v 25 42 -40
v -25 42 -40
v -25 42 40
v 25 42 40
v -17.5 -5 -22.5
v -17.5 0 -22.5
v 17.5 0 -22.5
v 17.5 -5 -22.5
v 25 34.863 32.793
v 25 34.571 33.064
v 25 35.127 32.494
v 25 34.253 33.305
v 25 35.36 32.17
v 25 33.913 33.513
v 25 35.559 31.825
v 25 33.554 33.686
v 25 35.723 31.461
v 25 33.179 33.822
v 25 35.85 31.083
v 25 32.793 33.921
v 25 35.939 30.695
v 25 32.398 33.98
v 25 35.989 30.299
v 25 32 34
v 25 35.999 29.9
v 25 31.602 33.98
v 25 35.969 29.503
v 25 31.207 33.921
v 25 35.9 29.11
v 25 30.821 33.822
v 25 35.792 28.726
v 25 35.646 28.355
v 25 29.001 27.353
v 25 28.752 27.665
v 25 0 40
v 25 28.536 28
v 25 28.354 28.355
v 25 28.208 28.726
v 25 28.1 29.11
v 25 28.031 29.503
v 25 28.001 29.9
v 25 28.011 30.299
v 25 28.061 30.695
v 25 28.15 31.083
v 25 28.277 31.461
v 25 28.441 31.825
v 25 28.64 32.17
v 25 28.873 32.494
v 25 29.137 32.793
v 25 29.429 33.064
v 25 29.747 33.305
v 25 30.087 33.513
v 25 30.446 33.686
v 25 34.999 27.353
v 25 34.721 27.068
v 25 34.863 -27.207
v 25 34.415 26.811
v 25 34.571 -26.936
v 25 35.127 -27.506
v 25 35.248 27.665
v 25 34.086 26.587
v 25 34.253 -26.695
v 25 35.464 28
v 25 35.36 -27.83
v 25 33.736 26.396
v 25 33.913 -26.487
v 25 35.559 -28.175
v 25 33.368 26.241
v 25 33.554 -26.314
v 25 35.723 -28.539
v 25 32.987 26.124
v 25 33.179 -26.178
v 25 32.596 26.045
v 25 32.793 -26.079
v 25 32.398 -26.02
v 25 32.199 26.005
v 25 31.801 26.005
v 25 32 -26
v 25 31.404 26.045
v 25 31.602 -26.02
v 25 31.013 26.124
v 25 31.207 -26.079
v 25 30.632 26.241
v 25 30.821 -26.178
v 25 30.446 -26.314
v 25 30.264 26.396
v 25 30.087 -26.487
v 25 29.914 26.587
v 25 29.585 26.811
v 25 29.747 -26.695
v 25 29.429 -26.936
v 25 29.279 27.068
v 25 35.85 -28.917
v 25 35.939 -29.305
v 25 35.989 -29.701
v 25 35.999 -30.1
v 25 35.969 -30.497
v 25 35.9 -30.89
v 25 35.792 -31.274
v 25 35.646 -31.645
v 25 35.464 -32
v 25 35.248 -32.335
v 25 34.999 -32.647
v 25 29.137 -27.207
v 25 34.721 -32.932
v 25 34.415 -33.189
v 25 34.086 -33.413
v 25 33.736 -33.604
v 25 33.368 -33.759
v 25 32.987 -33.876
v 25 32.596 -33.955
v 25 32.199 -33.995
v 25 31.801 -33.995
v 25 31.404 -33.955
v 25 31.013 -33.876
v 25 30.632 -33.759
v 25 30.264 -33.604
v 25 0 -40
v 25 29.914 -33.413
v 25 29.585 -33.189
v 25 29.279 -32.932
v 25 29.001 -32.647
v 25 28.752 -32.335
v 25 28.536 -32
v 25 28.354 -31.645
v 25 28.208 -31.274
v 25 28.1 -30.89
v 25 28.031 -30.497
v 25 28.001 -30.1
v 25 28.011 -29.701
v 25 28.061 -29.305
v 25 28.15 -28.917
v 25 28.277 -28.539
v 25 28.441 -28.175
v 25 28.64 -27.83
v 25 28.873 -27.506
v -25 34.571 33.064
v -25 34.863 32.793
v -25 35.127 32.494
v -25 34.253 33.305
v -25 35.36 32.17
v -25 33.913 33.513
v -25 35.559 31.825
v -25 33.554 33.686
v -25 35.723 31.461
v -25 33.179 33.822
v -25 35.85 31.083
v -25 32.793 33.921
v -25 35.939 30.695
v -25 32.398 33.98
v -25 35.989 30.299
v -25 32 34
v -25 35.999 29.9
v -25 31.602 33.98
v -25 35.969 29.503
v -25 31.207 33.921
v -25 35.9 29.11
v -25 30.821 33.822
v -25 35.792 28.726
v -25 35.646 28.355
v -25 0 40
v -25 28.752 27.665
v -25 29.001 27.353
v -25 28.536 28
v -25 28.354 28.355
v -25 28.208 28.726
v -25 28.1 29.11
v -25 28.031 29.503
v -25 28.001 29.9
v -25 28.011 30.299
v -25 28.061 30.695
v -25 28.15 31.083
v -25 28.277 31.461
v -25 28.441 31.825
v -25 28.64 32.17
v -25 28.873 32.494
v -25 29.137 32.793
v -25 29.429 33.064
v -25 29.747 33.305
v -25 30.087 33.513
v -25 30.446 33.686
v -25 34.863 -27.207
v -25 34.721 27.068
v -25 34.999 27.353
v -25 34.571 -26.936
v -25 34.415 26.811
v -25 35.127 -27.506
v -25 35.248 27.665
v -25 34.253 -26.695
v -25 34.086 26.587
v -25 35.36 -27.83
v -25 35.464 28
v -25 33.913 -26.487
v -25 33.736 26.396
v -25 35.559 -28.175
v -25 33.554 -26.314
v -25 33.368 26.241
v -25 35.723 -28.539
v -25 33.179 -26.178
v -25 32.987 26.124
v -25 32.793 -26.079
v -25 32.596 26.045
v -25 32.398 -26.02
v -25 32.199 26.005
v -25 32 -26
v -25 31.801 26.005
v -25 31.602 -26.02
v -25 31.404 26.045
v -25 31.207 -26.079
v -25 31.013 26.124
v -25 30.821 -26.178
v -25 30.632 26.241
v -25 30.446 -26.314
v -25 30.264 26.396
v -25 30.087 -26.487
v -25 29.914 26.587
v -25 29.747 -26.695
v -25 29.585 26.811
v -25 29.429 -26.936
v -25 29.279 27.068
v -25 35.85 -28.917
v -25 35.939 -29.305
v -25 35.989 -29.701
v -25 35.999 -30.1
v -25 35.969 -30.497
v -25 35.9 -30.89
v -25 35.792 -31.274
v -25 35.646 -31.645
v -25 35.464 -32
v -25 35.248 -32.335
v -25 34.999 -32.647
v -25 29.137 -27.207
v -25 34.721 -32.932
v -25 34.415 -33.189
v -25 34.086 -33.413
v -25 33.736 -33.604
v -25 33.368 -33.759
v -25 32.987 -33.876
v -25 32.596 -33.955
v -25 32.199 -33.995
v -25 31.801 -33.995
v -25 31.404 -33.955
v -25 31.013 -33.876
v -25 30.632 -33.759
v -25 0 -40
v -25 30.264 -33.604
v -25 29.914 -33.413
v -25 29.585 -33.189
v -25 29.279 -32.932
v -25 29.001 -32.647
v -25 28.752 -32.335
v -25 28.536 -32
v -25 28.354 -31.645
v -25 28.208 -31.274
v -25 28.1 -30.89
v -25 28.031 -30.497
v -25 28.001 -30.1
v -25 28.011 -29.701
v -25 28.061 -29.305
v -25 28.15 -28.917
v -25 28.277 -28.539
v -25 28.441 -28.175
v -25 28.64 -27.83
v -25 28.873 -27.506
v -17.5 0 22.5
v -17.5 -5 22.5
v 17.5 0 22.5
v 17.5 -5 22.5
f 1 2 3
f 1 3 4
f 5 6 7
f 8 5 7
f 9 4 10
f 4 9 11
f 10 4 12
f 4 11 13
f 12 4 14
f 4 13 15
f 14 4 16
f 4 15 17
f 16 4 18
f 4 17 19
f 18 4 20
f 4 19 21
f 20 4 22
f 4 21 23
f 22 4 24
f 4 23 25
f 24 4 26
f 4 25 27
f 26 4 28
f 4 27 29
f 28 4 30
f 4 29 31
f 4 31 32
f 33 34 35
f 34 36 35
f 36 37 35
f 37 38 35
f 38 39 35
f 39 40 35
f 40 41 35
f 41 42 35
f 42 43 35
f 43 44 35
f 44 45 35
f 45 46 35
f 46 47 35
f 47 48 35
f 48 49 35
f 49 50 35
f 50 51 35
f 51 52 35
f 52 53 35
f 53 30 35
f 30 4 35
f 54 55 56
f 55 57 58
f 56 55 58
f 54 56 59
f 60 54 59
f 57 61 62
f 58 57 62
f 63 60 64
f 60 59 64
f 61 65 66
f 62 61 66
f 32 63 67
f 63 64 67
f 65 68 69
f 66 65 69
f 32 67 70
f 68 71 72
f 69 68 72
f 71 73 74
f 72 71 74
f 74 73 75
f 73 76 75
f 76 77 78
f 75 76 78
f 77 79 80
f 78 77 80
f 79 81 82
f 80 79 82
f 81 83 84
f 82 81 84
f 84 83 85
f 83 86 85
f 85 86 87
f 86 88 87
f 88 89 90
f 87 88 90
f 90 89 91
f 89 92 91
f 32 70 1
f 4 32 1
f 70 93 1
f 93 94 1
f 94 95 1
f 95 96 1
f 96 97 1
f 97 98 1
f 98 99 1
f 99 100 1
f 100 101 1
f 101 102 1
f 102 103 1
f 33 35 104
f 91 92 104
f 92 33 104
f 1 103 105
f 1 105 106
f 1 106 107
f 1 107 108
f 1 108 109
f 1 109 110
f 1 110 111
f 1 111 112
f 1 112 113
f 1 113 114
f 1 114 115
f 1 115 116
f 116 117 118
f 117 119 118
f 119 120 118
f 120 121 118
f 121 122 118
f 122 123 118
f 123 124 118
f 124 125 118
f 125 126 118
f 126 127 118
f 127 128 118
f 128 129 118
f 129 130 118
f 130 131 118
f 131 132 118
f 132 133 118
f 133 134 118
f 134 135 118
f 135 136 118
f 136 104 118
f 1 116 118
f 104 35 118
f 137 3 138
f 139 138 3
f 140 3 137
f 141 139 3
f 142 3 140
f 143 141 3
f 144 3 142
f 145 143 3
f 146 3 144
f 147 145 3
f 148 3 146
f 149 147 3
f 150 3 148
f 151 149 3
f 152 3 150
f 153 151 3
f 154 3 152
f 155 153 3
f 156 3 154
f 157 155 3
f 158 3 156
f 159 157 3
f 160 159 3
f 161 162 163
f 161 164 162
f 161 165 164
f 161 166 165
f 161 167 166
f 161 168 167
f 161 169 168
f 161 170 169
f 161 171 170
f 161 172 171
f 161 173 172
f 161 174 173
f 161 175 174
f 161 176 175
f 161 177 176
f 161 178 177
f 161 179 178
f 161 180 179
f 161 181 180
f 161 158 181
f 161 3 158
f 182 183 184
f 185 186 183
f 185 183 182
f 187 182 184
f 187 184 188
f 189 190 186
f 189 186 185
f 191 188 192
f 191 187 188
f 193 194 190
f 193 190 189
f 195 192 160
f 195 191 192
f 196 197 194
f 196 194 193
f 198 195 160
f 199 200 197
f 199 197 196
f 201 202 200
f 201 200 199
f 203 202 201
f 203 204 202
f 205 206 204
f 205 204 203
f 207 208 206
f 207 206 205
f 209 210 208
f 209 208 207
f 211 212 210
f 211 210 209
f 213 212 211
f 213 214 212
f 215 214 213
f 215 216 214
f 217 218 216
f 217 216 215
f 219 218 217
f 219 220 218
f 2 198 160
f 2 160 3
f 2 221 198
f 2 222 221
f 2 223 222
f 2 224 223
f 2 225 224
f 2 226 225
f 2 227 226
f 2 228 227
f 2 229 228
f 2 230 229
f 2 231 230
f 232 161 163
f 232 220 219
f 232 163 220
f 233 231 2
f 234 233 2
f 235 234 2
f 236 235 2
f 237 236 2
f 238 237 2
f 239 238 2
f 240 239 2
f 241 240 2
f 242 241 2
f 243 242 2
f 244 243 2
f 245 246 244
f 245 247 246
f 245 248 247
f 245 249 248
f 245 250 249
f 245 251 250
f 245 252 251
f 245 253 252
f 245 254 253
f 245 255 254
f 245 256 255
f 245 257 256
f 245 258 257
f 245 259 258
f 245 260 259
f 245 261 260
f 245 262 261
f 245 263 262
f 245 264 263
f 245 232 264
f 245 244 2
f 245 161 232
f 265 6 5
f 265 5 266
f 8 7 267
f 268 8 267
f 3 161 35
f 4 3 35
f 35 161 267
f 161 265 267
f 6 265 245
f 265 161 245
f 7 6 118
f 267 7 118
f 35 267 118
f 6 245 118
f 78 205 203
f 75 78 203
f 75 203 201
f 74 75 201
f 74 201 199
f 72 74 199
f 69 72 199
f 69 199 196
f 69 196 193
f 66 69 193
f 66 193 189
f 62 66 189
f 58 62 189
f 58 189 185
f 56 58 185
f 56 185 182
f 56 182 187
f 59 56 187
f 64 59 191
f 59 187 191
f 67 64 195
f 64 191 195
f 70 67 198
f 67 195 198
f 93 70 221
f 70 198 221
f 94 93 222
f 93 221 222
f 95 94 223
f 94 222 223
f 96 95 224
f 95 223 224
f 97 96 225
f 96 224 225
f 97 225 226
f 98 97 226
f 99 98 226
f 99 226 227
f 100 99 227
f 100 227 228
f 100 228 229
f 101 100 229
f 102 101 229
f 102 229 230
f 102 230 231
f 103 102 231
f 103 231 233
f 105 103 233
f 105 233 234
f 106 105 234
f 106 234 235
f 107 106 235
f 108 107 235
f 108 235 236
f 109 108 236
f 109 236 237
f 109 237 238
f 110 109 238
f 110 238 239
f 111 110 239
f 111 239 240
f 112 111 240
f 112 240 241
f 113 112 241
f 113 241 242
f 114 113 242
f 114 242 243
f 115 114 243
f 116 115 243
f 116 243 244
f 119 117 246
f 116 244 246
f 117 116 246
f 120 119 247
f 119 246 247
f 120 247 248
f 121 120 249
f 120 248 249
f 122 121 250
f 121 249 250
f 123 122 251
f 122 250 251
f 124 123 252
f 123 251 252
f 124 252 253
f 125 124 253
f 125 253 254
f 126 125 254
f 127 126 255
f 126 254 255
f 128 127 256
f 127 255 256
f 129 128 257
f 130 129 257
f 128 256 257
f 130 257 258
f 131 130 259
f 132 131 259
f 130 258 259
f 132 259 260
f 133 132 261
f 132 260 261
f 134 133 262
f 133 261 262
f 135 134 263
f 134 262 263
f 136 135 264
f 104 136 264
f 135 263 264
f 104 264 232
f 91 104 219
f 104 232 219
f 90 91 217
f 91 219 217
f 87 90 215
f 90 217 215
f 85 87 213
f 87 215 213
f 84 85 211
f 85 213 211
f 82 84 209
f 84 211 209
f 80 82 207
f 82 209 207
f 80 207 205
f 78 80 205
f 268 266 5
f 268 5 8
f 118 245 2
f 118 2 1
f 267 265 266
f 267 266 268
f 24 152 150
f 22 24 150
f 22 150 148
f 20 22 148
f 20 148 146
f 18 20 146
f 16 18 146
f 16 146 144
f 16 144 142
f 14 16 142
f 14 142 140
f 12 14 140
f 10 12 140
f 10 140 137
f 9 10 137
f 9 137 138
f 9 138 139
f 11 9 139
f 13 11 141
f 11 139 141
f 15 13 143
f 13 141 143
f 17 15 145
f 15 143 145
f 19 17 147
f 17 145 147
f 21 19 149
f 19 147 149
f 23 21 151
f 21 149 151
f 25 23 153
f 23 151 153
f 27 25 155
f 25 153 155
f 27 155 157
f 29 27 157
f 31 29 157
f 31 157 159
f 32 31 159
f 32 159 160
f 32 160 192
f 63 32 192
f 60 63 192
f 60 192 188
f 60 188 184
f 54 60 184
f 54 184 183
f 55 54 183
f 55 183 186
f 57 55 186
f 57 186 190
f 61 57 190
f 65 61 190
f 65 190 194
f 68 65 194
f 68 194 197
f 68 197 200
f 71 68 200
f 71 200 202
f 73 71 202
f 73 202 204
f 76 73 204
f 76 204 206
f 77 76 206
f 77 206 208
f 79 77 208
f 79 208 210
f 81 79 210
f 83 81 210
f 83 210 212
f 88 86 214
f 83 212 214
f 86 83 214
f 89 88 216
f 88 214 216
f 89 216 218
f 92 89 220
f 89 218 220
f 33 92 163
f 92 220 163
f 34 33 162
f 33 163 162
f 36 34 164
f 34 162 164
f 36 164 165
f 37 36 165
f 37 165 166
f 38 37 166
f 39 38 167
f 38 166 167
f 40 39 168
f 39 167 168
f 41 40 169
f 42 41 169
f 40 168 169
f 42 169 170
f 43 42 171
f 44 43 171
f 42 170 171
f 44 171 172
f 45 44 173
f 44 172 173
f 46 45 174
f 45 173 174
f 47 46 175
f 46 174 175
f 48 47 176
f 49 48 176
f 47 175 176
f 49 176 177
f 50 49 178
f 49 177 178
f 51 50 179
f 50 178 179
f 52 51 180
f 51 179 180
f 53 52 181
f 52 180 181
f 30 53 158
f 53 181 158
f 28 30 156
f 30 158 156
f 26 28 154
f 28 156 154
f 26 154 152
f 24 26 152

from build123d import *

# Parameters (mm, degrees)
SKETCH1_W           = 50
SKETCH1_H           = 80
BOSS_EXTRUDE1_DEPTH = 42
SKETCH2_W           = 35
SKETCH2_H           = 45
BOSS_EXTRUDE2_DEPTH = 5
SKETCH3_R           = 4
CUT_EXTRUDE1_DEPTH  = 77.576758876


with BuildPart() as part:
    # Sketch1 → Boss-Extrude1 (new body)
    with BuildSketch(Plane(origin=(0, 0, 0), x_dir=(1, 0, 0), z_dir=(0, 1, 0))):
        Rectangle(SKETCH1_W, SKETCH1_H)
    extrude(amount=BOSS_EXTRUDE1_DEPTH)

    # Sketch2 → Boss-Extrude2 (add)
    with BuildSketch(Plane.XZ):
        Rectangle(SKETCH2_W, SKETCH2_H)
    extrude(amount=BOSS_EXTRUDE2_DEPTH)

    # Sketch3 → Cut-Extrude1 (cut, through all)
    with BuildSketch(Plane.ZY.offset(25)):
        with Locations((-30, 32)):
            Circle(SKETCH3_R)
        with Locations((30, 32)):
            Circle(SKETCH3_R)
    extrude(amount=-CUT_EXTRUDE1_DEPTH, mode=Mode.SUBTRACT)


solid = part.part
